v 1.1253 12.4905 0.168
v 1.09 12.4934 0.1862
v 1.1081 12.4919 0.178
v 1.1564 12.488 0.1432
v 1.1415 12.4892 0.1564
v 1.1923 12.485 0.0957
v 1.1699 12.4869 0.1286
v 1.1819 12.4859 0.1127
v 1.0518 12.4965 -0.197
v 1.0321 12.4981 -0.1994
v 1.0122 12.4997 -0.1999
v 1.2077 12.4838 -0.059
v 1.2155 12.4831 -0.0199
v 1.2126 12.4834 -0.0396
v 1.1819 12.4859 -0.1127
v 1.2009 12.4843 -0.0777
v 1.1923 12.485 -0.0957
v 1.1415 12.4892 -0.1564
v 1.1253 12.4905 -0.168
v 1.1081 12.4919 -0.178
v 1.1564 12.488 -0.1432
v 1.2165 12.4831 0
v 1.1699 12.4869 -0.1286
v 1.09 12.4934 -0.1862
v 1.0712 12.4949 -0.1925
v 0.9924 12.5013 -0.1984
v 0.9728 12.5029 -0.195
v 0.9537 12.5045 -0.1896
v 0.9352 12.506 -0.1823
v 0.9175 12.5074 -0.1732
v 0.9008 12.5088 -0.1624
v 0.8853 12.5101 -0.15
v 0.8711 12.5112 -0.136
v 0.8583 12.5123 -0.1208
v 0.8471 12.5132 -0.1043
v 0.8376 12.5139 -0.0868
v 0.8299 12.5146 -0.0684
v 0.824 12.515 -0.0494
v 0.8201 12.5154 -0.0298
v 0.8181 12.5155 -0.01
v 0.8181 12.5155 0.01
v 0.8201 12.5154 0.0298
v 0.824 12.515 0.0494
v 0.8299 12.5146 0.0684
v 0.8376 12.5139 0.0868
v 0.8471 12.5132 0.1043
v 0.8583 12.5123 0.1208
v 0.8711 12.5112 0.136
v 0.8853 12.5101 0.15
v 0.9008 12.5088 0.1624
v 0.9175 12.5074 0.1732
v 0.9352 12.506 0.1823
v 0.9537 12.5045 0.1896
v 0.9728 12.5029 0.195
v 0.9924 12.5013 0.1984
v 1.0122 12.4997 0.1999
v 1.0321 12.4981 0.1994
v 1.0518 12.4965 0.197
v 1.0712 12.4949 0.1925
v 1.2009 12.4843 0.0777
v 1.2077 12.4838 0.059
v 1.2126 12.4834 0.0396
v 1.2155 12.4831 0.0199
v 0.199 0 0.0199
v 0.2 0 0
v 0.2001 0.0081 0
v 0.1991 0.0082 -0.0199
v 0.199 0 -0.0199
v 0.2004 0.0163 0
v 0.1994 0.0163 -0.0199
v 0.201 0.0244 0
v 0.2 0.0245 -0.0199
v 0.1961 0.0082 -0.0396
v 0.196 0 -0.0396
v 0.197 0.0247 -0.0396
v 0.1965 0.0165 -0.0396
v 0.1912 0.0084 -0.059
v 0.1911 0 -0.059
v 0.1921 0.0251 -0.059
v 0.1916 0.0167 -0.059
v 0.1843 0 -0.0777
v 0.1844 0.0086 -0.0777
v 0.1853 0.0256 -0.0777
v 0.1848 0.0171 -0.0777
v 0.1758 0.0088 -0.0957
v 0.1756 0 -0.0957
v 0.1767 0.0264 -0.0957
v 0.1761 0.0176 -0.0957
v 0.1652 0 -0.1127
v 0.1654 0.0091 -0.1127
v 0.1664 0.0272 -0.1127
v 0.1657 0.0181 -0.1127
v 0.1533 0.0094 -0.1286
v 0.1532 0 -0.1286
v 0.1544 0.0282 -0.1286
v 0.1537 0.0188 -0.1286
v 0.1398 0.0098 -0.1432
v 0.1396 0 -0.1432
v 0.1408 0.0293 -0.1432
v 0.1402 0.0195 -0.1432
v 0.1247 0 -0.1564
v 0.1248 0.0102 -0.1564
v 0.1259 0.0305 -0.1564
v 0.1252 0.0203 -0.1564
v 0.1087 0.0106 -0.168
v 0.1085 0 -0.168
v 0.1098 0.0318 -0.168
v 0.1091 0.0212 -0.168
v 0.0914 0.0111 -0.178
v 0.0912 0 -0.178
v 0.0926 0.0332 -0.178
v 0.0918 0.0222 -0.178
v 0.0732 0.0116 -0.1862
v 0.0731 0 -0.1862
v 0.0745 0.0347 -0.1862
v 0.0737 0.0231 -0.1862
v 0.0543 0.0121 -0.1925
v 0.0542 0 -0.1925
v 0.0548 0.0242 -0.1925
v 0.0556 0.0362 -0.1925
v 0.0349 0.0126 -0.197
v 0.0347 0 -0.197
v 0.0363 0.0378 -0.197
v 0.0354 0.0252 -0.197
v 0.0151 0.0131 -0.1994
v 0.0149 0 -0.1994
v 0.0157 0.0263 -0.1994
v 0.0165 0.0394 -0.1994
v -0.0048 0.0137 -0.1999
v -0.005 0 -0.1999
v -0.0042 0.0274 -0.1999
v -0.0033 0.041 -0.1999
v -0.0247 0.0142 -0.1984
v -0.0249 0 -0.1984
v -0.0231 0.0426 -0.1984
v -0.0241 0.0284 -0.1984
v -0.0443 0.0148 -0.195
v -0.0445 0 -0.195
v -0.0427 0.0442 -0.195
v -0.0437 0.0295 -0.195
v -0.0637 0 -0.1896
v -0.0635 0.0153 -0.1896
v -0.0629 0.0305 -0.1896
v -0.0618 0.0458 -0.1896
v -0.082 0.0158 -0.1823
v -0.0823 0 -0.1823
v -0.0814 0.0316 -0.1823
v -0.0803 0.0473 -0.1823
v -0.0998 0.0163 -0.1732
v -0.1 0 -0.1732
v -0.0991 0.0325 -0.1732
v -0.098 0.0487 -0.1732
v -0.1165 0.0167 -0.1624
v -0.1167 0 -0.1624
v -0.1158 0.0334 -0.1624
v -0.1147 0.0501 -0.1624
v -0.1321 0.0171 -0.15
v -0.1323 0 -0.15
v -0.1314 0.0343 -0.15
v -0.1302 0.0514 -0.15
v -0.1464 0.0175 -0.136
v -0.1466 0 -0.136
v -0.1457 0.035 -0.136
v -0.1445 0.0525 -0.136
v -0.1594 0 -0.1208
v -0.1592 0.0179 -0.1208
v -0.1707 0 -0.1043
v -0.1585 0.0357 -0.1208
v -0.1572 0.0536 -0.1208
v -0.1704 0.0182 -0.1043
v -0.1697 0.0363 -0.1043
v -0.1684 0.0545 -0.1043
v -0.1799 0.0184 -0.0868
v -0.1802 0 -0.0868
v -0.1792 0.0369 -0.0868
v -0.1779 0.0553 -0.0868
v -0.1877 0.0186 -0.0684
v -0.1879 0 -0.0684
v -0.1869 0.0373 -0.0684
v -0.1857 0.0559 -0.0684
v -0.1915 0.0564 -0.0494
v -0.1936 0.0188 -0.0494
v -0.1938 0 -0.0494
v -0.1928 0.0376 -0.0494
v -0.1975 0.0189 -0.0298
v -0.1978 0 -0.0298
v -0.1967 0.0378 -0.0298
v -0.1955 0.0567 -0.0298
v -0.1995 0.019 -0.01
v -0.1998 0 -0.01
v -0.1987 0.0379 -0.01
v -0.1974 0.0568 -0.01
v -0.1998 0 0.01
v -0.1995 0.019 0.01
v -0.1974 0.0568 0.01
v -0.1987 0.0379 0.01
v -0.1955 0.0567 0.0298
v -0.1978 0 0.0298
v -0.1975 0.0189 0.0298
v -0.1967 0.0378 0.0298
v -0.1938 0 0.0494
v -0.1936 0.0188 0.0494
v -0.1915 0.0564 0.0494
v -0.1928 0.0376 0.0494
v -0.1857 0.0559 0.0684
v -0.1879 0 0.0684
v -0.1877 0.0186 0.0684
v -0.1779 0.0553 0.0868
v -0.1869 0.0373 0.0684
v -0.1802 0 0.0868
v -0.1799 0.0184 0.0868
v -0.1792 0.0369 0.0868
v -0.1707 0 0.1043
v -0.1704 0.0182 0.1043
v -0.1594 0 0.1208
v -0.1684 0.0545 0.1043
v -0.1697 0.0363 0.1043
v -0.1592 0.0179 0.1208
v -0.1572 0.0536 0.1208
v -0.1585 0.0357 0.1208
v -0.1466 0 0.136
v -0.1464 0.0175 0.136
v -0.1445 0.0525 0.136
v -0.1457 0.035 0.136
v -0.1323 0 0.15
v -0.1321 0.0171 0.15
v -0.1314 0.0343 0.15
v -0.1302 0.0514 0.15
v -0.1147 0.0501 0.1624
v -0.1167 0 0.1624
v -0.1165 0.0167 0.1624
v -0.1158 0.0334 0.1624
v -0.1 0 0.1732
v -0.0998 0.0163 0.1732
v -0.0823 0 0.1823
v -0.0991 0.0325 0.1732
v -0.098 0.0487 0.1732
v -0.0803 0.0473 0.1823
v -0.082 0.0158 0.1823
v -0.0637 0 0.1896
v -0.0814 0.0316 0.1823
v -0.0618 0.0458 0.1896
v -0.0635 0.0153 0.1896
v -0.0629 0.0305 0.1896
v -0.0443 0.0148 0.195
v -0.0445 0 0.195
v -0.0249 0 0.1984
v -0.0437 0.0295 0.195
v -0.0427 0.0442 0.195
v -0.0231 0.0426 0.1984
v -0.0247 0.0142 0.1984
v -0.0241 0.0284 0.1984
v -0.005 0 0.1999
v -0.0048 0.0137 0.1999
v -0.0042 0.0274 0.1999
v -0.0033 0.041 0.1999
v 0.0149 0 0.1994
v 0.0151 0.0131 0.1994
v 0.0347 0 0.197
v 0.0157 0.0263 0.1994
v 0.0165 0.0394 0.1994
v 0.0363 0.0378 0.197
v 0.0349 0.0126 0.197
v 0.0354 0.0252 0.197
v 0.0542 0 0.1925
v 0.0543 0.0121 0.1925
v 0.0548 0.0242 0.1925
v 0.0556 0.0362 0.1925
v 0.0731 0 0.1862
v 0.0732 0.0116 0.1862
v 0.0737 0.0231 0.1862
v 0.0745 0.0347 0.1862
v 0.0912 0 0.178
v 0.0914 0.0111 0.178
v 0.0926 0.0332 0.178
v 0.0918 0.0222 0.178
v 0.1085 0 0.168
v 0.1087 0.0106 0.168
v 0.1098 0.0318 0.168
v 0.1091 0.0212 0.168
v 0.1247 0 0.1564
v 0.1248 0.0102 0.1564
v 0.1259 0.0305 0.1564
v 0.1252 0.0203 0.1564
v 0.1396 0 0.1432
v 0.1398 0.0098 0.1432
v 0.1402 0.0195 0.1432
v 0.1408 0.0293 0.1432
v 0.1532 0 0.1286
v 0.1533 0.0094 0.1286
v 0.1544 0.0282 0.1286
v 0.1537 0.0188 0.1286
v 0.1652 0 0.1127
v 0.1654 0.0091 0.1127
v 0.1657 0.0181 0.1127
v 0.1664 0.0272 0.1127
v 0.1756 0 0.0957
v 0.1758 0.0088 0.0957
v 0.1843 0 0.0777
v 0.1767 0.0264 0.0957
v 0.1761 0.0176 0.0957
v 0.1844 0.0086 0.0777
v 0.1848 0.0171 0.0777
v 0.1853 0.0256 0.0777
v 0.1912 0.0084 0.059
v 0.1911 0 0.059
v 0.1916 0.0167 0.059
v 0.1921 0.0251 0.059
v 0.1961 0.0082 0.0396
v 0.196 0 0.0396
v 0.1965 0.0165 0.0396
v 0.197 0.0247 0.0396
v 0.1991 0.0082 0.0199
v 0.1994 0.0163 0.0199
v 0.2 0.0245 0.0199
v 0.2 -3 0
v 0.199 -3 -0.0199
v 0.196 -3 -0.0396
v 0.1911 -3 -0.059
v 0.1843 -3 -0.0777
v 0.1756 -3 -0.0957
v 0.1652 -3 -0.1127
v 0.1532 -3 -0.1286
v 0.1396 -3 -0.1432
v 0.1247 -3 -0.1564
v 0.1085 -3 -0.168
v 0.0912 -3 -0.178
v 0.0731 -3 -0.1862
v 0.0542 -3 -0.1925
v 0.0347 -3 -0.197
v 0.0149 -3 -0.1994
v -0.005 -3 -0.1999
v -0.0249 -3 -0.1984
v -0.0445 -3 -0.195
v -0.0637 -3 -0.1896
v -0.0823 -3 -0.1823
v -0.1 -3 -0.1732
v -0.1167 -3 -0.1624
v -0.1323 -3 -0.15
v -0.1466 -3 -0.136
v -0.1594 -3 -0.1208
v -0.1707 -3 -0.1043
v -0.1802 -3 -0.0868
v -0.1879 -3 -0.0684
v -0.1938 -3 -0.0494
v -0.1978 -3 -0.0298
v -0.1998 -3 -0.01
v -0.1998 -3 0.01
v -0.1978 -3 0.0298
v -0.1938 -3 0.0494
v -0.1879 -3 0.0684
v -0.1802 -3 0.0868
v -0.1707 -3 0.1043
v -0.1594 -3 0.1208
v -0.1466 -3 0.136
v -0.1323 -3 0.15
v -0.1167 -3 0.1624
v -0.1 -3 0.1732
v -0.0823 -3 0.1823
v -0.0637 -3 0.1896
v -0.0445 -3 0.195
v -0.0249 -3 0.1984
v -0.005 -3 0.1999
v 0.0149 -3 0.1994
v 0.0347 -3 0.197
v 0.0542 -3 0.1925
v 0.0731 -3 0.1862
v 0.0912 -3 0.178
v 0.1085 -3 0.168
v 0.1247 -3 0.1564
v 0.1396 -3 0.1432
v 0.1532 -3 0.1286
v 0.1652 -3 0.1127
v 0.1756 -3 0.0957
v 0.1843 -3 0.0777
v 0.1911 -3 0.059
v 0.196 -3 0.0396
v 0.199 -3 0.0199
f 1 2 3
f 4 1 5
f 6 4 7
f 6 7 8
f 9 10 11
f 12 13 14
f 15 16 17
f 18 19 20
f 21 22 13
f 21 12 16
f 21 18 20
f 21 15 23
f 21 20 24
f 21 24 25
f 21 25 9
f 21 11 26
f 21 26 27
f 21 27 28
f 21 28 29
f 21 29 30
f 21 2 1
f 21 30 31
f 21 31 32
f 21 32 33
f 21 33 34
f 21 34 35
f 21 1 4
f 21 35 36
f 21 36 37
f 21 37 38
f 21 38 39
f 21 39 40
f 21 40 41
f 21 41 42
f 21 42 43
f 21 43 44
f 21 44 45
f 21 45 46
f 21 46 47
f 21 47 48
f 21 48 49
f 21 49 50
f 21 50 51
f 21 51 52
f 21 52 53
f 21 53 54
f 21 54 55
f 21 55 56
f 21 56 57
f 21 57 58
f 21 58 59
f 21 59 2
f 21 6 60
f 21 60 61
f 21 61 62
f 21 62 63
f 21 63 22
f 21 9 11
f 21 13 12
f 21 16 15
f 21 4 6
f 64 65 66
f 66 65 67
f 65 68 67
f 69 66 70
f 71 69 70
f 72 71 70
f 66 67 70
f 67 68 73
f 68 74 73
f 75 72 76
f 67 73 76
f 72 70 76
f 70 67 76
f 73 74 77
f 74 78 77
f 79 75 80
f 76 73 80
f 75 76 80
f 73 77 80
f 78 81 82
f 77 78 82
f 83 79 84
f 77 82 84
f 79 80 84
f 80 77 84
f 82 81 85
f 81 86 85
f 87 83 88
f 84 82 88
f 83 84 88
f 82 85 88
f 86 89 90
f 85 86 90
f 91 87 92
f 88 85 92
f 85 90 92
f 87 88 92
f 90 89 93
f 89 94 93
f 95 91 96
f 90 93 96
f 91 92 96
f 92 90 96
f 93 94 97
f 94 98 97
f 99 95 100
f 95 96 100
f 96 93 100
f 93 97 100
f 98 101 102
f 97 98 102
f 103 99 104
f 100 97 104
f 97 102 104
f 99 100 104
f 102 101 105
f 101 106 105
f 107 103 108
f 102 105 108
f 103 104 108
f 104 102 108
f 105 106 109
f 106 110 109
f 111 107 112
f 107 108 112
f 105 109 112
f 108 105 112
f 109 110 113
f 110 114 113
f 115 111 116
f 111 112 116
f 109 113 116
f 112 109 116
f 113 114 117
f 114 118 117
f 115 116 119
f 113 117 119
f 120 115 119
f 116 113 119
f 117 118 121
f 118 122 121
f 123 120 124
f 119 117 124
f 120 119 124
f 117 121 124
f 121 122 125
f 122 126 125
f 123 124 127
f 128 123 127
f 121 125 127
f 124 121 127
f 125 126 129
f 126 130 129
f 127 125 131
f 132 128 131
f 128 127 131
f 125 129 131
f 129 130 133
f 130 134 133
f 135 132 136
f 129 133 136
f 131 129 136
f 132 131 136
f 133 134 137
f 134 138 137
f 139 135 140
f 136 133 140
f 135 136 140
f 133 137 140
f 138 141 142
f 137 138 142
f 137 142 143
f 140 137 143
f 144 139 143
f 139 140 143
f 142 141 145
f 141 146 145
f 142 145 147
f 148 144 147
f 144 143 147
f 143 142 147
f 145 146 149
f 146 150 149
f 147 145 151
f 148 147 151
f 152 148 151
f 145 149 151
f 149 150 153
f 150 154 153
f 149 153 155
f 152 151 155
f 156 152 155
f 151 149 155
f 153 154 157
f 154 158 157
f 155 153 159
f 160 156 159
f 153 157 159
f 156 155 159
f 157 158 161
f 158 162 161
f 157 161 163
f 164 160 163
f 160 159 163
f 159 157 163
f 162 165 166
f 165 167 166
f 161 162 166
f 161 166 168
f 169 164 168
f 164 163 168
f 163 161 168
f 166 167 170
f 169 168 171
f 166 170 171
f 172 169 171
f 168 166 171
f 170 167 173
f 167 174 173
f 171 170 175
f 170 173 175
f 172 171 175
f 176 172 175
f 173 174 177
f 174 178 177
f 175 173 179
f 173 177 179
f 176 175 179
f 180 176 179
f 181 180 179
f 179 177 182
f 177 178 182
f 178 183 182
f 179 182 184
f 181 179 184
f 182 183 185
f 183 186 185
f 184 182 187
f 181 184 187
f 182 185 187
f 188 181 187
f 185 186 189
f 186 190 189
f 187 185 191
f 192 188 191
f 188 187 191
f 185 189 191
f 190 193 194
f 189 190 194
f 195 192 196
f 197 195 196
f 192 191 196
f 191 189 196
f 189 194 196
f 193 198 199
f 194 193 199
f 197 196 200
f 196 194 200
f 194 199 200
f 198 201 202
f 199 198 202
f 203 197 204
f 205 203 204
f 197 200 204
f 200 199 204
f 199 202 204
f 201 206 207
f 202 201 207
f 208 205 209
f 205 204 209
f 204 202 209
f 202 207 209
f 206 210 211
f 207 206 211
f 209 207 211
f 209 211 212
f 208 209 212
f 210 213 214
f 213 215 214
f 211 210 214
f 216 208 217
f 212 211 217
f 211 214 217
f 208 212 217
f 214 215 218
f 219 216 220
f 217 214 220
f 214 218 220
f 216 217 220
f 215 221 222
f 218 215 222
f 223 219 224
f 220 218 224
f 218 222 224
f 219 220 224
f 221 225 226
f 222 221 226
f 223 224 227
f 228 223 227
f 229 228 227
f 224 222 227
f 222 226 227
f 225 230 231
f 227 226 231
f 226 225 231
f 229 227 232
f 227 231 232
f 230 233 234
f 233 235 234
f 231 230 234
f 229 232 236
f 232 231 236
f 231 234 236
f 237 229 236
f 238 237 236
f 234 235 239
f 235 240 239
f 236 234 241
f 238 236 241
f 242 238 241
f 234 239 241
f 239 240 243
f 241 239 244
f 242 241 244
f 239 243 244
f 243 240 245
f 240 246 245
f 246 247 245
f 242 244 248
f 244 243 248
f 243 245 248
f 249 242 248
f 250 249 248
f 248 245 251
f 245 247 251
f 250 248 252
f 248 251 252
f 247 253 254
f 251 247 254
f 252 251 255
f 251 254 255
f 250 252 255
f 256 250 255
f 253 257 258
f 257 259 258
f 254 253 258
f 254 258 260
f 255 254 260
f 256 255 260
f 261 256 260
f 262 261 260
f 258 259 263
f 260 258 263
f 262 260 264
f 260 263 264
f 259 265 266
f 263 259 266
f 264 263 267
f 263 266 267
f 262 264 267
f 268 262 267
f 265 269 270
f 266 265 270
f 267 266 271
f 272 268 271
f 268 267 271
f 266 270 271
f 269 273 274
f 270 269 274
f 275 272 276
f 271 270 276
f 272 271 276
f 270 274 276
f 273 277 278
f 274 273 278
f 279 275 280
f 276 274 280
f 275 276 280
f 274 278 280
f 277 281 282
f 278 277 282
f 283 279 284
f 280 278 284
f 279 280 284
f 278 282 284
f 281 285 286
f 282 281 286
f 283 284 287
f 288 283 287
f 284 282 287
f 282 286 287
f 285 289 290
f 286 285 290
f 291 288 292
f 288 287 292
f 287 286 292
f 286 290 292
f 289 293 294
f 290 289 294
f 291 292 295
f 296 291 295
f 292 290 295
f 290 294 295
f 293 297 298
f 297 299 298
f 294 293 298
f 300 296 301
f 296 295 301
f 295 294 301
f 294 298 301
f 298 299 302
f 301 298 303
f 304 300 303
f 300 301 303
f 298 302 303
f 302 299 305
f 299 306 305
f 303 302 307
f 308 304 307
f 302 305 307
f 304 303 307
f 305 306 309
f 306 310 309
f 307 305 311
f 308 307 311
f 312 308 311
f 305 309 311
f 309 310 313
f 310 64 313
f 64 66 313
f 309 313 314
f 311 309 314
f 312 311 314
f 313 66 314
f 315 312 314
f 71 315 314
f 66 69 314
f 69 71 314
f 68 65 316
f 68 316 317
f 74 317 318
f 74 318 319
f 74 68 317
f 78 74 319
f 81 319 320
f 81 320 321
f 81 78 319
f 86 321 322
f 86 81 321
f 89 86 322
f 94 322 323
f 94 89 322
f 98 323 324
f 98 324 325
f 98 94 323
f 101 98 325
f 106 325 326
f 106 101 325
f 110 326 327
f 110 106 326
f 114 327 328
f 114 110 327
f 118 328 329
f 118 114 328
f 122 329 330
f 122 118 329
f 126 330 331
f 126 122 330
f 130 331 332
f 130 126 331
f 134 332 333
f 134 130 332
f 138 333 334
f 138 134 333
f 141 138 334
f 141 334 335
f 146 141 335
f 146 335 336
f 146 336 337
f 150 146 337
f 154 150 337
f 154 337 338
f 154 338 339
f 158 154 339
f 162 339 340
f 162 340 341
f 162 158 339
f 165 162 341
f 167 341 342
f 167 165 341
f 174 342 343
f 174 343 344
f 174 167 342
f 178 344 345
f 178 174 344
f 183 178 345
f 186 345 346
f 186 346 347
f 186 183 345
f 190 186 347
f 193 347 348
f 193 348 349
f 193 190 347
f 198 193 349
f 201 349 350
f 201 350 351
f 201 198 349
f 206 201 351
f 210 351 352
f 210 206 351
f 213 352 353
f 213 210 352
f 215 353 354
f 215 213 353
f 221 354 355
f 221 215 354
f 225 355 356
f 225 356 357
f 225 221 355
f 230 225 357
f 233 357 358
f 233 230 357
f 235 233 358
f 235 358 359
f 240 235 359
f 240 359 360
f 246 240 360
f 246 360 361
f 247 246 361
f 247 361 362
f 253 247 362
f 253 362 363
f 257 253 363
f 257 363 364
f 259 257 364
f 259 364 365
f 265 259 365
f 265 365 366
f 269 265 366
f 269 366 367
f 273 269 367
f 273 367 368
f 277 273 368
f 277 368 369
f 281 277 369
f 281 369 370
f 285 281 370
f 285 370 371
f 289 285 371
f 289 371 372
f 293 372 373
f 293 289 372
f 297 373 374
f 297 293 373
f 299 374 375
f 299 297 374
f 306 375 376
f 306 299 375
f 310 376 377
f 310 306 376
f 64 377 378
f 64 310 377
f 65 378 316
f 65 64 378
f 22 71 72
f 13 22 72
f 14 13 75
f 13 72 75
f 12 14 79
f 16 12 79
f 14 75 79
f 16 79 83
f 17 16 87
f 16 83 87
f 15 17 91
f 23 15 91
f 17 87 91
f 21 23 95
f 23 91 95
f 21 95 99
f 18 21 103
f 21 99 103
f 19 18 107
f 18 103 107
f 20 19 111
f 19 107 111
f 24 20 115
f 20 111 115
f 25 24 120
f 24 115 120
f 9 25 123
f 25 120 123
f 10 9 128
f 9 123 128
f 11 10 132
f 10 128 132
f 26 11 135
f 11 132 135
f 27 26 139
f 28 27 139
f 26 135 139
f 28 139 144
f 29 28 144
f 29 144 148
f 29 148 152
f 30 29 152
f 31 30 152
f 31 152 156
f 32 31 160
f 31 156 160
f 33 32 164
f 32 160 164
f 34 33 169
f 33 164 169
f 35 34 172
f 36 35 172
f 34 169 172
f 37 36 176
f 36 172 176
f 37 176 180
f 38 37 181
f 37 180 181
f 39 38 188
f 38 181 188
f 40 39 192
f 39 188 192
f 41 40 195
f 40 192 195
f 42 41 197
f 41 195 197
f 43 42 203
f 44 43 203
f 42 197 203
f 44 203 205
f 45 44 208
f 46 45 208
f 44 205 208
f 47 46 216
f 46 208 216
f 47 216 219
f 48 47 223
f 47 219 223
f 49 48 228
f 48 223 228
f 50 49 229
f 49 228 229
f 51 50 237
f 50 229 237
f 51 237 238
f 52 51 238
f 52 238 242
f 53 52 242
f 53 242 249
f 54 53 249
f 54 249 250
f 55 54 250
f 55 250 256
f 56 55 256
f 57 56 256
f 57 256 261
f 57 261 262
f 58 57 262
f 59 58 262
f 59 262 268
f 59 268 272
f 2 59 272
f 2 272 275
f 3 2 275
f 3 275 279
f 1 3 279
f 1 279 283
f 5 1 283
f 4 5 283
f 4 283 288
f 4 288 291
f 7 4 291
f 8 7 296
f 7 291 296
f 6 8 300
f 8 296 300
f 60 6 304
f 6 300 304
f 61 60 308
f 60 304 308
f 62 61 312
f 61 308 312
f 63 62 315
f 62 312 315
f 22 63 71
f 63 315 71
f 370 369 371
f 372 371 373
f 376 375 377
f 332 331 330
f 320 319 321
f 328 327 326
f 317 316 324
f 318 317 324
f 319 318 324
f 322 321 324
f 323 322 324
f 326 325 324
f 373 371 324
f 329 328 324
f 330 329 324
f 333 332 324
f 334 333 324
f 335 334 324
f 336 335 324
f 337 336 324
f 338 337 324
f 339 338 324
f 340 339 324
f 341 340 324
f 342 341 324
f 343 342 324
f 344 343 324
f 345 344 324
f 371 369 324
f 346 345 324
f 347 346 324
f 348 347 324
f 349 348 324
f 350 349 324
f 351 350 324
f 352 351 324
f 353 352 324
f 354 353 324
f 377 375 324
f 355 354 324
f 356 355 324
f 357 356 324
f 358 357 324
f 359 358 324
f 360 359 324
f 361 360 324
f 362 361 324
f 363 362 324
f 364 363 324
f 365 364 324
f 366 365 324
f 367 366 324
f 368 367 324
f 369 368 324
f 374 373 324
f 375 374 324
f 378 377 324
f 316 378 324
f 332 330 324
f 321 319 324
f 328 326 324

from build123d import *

# Parameters (mm, degrees)
SKETCH1_R           = 0.2
BOSS_EXTRUDE1_DEPTH = 3
SKETCH2_R           = 0.2
REVOLVE1_ANGLE      = 4.66
SKETCH3_R           = 0.2
BOSS_EXTRUDE2_DEPTH = 12.5


with BuildPart() as part:
    # Sketch1 → Boss-Extrude1 (new body)
    with BuildSketch(Plane(origin=(0, 0, 0), x_dir=(1, 0, 0), z_dir=(0, 1, 0))):
        Circle(SKETCH1_R)
    extrude(amount=-BOSS_EXTRUDE1_DEPTH)

    # Sketch2 → Revolve1 (revolve)
    with BuildSketch(Plane(origin=(0, 0, 0), x_dir=(1, 0, 0), z_dir=(0, 1, 0))):
        Circle(SKETCH2_R)
    revolve(axis=Axis((0.5, 0, -0.2), (0, 0, -1)), revolution_arc=REVOLVE1_ANGLE)

    # Sketch3 → Boss-Extrude2 (add)
    with BuildSketch(Plane(origin=(0.003300189, 0.040487072, 0), x_dir=(0.996694348, -0.081242705, 0), z_dir=(0.081242705, 0.996694348, 0))):
        with Locations((-0.001652826, 0)):
            Circle(SKETCH3_R)
    extrude(amount=BOSS_EXTRUDE2_DEPTH)


solid = part.part
